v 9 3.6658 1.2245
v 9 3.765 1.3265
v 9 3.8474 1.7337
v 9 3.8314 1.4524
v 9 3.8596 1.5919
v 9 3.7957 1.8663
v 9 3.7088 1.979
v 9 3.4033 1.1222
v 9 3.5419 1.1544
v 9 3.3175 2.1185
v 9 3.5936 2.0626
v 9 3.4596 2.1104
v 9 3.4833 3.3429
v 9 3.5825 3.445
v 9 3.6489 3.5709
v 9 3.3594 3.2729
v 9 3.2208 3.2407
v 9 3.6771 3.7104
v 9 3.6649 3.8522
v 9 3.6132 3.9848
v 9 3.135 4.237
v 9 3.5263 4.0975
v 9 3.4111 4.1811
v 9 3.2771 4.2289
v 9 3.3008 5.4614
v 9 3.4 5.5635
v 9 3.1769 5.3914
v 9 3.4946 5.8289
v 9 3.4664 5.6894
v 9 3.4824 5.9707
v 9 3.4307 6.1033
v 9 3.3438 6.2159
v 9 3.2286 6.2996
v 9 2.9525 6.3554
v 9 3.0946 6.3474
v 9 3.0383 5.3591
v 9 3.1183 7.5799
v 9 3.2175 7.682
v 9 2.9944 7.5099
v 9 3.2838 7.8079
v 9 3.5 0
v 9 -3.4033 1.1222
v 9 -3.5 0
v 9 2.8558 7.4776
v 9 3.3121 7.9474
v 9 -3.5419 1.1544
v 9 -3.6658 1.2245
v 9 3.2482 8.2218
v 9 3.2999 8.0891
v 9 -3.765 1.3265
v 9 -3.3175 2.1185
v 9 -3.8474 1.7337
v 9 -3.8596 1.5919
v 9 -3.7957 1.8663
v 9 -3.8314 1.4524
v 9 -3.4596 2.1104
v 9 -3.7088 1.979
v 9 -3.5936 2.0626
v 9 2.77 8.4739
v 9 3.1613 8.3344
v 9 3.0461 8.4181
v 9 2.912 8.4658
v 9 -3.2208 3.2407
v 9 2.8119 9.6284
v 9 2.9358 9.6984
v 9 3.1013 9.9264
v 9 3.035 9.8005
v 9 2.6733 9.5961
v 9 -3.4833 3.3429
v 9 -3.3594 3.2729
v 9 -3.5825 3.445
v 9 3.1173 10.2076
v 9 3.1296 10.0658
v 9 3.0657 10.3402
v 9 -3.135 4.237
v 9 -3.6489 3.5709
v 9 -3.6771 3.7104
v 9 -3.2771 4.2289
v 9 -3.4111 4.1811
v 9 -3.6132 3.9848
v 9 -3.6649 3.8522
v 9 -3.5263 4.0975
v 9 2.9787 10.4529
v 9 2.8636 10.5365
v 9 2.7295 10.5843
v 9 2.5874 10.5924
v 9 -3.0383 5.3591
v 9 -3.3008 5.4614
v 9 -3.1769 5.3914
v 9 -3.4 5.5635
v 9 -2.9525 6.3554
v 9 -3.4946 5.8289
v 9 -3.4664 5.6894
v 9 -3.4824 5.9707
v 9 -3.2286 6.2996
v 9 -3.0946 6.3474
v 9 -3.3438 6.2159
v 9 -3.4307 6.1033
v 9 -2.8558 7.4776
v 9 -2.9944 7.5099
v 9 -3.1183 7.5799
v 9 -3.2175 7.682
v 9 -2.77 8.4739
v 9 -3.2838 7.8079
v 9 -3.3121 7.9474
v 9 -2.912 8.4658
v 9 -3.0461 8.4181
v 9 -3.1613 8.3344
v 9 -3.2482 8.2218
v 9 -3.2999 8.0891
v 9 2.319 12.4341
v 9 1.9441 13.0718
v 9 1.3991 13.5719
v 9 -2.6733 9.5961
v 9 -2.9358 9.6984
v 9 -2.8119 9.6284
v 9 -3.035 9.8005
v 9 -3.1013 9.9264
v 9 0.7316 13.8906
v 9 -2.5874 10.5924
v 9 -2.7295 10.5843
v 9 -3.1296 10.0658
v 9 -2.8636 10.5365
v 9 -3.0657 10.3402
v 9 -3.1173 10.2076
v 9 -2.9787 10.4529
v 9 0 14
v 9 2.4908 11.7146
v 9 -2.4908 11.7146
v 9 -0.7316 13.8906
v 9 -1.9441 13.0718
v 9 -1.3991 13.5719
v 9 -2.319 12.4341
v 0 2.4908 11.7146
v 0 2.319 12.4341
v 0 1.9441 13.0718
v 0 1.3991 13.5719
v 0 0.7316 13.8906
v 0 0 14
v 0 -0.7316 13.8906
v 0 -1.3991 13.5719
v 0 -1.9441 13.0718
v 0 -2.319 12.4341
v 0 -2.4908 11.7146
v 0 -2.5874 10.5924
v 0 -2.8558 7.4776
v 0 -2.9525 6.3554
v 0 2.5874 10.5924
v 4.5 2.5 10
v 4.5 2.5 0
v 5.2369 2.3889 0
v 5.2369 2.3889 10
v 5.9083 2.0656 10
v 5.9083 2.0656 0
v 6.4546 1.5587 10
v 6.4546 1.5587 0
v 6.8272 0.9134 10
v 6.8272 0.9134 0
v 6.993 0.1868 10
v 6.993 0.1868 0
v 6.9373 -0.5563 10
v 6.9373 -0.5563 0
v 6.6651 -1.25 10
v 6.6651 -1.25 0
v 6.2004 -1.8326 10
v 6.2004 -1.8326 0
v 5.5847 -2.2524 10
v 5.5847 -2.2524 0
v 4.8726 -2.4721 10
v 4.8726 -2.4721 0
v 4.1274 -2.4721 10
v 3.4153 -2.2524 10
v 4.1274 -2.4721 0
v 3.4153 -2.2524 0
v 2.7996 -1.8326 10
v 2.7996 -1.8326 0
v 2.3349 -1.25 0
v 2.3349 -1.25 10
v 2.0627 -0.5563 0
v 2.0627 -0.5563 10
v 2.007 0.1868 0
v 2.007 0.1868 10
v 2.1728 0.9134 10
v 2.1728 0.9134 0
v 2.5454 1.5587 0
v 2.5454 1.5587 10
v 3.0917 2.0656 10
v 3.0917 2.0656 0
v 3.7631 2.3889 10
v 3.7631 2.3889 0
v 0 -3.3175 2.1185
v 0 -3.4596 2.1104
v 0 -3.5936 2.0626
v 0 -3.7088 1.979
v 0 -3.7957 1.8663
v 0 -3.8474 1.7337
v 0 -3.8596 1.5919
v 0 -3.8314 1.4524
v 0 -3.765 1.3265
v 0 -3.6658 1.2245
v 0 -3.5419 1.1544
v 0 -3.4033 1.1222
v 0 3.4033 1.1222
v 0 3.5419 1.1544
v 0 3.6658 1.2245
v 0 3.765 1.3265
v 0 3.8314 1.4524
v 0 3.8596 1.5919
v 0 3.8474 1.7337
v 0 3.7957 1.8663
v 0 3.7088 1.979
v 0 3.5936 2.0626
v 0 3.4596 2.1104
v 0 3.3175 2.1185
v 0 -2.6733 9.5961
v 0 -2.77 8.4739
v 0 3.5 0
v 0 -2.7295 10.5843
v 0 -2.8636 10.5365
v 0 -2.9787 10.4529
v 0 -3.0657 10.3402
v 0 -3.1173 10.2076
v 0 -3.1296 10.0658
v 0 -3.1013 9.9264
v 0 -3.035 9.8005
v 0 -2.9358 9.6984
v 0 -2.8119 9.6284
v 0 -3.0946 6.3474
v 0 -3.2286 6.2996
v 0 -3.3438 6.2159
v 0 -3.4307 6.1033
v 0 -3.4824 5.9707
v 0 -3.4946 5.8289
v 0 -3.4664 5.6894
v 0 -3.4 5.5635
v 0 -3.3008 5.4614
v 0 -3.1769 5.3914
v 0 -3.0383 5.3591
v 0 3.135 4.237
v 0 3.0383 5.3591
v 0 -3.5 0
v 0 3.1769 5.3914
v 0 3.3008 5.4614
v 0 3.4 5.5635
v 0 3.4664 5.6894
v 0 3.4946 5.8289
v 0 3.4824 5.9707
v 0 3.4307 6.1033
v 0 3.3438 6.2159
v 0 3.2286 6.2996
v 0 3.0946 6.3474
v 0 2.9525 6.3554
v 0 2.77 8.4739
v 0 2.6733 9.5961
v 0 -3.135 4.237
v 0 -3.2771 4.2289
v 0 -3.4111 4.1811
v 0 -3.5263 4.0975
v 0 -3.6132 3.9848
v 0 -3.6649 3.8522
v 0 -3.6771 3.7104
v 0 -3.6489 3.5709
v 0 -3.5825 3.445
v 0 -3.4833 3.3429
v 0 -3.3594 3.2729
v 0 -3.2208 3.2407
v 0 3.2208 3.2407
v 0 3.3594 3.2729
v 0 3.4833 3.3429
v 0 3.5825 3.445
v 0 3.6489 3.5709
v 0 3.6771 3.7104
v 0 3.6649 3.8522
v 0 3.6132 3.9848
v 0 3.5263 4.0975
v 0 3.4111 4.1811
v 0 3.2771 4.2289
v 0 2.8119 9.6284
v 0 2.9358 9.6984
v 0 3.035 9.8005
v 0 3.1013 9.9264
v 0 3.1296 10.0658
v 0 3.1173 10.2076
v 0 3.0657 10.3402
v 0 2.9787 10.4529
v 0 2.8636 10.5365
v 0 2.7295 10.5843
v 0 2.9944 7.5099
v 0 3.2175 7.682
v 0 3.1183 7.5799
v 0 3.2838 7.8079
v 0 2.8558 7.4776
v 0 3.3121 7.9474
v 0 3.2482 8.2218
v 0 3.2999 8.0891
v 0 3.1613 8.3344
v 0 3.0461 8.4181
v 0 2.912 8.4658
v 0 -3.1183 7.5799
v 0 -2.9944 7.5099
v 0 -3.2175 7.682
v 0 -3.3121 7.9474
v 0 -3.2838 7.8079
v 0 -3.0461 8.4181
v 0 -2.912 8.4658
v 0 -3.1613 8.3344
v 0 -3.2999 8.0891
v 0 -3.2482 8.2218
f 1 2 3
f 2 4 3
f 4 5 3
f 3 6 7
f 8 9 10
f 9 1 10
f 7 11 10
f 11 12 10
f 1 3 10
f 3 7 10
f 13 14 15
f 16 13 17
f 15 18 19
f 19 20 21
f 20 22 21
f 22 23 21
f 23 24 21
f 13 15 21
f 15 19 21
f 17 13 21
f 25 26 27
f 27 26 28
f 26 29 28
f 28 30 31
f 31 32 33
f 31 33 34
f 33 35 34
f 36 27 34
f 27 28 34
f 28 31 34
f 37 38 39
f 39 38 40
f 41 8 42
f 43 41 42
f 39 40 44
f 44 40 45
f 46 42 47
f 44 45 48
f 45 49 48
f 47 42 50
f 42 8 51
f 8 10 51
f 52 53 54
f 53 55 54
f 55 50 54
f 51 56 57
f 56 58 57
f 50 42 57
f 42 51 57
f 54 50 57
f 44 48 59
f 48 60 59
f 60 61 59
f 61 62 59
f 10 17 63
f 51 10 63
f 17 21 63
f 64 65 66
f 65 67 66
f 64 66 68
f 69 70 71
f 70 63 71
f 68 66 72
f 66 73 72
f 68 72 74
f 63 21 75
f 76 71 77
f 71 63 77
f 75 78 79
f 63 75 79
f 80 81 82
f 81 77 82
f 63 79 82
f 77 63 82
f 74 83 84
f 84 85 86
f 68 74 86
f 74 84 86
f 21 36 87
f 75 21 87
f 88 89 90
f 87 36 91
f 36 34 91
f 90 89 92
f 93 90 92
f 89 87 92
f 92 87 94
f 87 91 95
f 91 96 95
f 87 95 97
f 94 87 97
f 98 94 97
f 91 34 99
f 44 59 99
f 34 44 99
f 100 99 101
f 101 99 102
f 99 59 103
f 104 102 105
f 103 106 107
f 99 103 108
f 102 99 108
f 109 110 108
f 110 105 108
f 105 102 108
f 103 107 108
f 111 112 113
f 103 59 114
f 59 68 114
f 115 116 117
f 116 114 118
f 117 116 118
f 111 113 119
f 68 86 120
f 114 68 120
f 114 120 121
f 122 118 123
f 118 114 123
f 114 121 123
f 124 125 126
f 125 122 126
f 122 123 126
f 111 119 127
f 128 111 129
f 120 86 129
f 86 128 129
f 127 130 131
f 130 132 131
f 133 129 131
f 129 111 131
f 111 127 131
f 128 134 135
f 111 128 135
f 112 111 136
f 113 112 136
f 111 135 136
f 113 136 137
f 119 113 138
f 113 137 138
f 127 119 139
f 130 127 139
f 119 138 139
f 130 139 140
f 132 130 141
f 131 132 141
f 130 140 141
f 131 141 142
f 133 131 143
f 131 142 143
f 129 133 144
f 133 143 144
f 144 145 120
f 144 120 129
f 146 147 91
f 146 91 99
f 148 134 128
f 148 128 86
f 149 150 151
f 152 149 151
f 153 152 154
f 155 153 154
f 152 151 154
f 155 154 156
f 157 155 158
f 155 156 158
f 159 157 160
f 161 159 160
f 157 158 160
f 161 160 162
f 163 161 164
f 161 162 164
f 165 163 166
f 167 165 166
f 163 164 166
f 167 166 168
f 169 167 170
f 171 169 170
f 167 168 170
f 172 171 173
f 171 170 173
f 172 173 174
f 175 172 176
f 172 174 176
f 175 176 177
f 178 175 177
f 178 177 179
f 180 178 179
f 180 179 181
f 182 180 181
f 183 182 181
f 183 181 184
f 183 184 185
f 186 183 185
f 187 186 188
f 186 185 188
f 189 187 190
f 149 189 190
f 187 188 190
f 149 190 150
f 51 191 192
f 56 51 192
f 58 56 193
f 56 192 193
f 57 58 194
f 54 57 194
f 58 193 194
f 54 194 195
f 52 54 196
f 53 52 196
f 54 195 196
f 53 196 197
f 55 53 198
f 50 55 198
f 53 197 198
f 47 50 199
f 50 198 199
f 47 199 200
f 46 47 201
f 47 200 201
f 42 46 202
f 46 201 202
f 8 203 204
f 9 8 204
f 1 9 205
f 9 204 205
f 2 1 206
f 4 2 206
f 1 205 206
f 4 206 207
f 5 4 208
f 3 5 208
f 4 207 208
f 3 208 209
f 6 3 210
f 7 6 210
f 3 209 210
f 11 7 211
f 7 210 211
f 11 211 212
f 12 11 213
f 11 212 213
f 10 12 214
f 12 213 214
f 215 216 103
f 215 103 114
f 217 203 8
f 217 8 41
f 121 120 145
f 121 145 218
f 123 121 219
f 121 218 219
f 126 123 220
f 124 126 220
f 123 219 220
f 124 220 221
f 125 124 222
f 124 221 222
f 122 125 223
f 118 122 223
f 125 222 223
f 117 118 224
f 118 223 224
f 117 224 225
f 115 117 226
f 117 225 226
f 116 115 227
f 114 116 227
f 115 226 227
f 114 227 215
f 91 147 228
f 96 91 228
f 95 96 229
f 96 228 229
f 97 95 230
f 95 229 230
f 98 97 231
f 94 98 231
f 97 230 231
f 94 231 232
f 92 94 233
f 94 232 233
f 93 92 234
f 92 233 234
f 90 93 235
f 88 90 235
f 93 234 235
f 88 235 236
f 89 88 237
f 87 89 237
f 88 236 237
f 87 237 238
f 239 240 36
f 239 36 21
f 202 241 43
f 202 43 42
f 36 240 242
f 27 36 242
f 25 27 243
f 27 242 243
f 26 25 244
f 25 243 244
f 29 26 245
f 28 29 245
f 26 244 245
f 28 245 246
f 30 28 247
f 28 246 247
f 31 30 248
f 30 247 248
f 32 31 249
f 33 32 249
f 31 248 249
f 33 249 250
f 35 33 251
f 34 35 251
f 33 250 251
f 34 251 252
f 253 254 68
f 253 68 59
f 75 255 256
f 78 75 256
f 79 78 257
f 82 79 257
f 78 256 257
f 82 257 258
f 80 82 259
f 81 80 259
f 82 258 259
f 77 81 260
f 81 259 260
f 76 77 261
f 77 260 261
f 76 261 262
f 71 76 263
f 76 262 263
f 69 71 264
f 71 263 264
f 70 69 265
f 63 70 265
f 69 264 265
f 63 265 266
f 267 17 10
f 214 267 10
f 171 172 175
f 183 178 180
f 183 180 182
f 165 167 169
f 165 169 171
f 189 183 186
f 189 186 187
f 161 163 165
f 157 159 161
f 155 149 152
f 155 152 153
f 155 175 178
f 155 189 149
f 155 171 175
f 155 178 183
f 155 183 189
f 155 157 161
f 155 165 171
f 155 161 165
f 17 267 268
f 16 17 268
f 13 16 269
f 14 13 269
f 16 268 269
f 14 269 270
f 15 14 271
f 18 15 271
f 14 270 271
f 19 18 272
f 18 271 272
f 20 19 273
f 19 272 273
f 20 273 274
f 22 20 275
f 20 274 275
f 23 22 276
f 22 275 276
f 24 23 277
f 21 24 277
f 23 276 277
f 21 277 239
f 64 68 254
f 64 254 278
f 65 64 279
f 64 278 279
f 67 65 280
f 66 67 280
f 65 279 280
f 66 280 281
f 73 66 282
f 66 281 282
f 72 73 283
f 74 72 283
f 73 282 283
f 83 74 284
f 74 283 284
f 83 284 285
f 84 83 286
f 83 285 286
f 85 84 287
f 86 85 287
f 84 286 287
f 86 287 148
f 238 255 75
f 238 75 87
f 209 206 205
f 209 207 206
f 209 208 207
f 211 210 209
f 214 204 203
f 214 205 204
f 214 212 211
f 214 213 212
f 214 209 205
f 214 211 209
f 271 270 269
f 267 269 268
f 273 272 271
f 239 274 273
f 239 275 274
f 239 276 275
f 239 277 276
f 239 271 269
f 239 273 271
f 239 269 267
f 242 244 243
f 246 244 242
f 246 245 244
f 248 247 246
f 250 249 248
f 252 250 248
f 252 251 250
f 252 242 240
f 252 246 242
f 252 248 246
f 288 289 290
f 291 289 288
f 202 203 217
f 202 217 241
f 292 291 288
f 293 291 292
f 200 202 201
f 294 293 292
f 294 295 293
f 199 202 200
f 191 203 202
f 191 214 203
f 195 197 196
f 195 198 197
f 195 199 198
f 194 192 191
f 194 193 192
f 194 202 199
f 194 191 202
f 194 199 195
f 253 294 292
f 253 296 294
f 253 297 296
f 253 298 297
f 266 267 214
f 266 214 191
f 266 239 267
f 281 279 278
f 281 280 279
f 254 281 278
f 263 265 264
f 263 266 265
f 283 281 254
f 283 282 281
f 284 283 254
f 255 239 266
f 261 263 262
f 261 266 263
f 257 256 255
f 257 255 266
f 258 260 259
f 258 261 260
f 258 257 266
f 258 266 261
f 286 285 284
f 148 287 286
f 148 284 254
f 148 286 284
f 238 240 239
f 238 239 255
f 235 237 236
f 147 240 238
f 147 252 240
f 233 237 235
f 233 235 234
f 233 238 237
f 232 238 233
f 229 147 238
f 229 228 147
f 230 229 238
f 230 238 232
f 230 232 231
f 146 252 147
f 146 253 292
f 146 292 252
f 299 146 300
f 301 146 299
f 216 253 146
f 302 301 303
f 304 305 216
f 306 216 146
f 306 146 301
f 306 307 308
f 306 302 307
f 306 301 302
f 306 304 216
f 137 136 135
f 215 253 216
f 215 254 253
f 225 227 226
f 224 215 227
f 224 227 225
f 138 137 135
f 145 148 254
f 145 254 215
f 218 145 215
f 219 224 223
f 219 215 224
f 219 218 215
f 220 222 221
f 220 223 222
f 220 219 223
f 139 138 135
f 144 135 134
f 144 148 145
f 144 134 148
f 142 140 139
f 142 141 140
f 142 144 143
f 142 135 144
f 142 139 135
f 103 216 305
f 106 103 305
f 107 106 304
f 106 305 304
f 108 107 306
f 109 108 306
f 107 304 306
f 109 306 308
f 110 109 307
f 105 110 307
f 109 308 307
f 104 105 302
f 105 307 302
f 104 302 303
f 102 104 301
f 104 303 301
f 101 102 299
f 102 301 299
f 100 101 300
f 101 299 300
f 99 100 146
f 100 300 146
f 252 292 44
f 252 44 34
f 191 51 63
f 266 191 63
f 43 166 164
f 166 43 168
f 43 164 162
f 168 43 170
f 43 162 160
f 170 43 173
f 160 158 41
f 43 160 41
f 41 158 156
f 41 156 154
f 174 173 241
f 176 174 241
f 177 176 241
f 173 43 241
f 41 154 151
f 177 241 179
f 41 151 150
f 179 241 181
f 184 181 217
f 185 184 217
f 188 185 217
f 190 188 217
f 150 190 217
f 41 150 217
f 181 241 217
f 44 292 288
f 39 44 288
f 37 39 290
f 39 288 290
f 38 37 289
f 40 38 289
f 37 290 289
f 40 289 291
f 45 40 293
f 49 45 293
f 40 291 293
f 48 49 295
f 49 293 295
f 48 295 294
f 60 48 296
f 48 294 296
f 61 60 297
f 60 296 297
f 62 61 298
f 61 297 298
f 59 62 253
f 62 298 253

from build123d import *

# Parameters (mm, degrees)
PAD_DEPTH    = 9
SKETCH001_R  = 2.5
POCKET_DEPTH = 10


with BuildPart() as part:
    # Sketch → Pad (new body)
    with BuildSketch(Plane.YZ):
        with BuildLine():
            Line((-3.5, 0), (-3.403323, 1.122173))
            ThreePointArc((-3.31749, 2.118482), (-3.858561, 1.663244), (-3.403323, 1.122173))
            Line((-3.31749, 2.118482), (-3.220813, 3.240655))
            ThreePointArc((-3.13498, 4.236964), (-3.676052, 3.781726), (-3.220813, 3.240655))
            Line((-3.13498, 4.236964), (-3.038304, 5.359137))
            ThreePointArc((-2.95247, 6.355446), (-3.493542, 5.900208), (-3.038304, 5.359137))
            Line((-2.95247, 6.355446), (-2.855794, 7.477619))
            ThreePointArc((-2.76996, 8.473929), (-3.311032, 8.01869), (-2.855794, 7.477619))
            Line((-2.76996, 8.473929), (-2.673284, 9.596101))
            ThreePointArc((-2.58745, 10.592411), (-3.128522, 10.137173), (-2.673284, 9.596101))
            Line((-2.58745, 10.592411), (-2.490774, 11.714583))
            ThreePointArc((2.490774, 11.714583), (0, 14), (-2.490774, 11.714583))
            Line((2.490774, 11.714583), (2.58745, 10.592411))
            ThreePointArc((2.673284, 9.596101), (3.128522, 10.137173), (2.58745, 10.592411))
            Line((2.673284, 9.596101), (2.76996, 8.473929))
            ThreePointArc((2.855794, 7.477619), (3.311032, 8.01869), (2.76996, 8.473929))
            Line((2.855794, 7.477619), (2.95247, 6.355446))
            ThreePointArc((3.038304, 5.359137), (3.493542, 5.900208), (2.95247, 6.355446))
            Line((3.038304, 5.359137), (3.13498, 4.236964))
            ThreePointArc((3.220813, 3.240655), (3.676052, 3.781726), (3.13498, 4.236964))
            Line((3.220813, 3.240655), (3.31749, 2.118482))
            ThreePointArc((3.403323, 1.122173), (3.858561, 1.663244), (3.31749, 2.118482))
            Line((3.403323, 1.122173), (3.5, 0))
            Line((-3.5, 0), (3.5, 0))
        make_face()
    extrude(amount=PAD_DEPTH)

    # Sketch001 → Pocket (cut)
    with BuildSketch(Plane.YX):
        with Locations((0, 4.5)):
            Circle(SKETCH001_R)
    extrude(amount=-POCKET_DEPTH, mode=Mode.SUBTRACT)


solid = part.part
